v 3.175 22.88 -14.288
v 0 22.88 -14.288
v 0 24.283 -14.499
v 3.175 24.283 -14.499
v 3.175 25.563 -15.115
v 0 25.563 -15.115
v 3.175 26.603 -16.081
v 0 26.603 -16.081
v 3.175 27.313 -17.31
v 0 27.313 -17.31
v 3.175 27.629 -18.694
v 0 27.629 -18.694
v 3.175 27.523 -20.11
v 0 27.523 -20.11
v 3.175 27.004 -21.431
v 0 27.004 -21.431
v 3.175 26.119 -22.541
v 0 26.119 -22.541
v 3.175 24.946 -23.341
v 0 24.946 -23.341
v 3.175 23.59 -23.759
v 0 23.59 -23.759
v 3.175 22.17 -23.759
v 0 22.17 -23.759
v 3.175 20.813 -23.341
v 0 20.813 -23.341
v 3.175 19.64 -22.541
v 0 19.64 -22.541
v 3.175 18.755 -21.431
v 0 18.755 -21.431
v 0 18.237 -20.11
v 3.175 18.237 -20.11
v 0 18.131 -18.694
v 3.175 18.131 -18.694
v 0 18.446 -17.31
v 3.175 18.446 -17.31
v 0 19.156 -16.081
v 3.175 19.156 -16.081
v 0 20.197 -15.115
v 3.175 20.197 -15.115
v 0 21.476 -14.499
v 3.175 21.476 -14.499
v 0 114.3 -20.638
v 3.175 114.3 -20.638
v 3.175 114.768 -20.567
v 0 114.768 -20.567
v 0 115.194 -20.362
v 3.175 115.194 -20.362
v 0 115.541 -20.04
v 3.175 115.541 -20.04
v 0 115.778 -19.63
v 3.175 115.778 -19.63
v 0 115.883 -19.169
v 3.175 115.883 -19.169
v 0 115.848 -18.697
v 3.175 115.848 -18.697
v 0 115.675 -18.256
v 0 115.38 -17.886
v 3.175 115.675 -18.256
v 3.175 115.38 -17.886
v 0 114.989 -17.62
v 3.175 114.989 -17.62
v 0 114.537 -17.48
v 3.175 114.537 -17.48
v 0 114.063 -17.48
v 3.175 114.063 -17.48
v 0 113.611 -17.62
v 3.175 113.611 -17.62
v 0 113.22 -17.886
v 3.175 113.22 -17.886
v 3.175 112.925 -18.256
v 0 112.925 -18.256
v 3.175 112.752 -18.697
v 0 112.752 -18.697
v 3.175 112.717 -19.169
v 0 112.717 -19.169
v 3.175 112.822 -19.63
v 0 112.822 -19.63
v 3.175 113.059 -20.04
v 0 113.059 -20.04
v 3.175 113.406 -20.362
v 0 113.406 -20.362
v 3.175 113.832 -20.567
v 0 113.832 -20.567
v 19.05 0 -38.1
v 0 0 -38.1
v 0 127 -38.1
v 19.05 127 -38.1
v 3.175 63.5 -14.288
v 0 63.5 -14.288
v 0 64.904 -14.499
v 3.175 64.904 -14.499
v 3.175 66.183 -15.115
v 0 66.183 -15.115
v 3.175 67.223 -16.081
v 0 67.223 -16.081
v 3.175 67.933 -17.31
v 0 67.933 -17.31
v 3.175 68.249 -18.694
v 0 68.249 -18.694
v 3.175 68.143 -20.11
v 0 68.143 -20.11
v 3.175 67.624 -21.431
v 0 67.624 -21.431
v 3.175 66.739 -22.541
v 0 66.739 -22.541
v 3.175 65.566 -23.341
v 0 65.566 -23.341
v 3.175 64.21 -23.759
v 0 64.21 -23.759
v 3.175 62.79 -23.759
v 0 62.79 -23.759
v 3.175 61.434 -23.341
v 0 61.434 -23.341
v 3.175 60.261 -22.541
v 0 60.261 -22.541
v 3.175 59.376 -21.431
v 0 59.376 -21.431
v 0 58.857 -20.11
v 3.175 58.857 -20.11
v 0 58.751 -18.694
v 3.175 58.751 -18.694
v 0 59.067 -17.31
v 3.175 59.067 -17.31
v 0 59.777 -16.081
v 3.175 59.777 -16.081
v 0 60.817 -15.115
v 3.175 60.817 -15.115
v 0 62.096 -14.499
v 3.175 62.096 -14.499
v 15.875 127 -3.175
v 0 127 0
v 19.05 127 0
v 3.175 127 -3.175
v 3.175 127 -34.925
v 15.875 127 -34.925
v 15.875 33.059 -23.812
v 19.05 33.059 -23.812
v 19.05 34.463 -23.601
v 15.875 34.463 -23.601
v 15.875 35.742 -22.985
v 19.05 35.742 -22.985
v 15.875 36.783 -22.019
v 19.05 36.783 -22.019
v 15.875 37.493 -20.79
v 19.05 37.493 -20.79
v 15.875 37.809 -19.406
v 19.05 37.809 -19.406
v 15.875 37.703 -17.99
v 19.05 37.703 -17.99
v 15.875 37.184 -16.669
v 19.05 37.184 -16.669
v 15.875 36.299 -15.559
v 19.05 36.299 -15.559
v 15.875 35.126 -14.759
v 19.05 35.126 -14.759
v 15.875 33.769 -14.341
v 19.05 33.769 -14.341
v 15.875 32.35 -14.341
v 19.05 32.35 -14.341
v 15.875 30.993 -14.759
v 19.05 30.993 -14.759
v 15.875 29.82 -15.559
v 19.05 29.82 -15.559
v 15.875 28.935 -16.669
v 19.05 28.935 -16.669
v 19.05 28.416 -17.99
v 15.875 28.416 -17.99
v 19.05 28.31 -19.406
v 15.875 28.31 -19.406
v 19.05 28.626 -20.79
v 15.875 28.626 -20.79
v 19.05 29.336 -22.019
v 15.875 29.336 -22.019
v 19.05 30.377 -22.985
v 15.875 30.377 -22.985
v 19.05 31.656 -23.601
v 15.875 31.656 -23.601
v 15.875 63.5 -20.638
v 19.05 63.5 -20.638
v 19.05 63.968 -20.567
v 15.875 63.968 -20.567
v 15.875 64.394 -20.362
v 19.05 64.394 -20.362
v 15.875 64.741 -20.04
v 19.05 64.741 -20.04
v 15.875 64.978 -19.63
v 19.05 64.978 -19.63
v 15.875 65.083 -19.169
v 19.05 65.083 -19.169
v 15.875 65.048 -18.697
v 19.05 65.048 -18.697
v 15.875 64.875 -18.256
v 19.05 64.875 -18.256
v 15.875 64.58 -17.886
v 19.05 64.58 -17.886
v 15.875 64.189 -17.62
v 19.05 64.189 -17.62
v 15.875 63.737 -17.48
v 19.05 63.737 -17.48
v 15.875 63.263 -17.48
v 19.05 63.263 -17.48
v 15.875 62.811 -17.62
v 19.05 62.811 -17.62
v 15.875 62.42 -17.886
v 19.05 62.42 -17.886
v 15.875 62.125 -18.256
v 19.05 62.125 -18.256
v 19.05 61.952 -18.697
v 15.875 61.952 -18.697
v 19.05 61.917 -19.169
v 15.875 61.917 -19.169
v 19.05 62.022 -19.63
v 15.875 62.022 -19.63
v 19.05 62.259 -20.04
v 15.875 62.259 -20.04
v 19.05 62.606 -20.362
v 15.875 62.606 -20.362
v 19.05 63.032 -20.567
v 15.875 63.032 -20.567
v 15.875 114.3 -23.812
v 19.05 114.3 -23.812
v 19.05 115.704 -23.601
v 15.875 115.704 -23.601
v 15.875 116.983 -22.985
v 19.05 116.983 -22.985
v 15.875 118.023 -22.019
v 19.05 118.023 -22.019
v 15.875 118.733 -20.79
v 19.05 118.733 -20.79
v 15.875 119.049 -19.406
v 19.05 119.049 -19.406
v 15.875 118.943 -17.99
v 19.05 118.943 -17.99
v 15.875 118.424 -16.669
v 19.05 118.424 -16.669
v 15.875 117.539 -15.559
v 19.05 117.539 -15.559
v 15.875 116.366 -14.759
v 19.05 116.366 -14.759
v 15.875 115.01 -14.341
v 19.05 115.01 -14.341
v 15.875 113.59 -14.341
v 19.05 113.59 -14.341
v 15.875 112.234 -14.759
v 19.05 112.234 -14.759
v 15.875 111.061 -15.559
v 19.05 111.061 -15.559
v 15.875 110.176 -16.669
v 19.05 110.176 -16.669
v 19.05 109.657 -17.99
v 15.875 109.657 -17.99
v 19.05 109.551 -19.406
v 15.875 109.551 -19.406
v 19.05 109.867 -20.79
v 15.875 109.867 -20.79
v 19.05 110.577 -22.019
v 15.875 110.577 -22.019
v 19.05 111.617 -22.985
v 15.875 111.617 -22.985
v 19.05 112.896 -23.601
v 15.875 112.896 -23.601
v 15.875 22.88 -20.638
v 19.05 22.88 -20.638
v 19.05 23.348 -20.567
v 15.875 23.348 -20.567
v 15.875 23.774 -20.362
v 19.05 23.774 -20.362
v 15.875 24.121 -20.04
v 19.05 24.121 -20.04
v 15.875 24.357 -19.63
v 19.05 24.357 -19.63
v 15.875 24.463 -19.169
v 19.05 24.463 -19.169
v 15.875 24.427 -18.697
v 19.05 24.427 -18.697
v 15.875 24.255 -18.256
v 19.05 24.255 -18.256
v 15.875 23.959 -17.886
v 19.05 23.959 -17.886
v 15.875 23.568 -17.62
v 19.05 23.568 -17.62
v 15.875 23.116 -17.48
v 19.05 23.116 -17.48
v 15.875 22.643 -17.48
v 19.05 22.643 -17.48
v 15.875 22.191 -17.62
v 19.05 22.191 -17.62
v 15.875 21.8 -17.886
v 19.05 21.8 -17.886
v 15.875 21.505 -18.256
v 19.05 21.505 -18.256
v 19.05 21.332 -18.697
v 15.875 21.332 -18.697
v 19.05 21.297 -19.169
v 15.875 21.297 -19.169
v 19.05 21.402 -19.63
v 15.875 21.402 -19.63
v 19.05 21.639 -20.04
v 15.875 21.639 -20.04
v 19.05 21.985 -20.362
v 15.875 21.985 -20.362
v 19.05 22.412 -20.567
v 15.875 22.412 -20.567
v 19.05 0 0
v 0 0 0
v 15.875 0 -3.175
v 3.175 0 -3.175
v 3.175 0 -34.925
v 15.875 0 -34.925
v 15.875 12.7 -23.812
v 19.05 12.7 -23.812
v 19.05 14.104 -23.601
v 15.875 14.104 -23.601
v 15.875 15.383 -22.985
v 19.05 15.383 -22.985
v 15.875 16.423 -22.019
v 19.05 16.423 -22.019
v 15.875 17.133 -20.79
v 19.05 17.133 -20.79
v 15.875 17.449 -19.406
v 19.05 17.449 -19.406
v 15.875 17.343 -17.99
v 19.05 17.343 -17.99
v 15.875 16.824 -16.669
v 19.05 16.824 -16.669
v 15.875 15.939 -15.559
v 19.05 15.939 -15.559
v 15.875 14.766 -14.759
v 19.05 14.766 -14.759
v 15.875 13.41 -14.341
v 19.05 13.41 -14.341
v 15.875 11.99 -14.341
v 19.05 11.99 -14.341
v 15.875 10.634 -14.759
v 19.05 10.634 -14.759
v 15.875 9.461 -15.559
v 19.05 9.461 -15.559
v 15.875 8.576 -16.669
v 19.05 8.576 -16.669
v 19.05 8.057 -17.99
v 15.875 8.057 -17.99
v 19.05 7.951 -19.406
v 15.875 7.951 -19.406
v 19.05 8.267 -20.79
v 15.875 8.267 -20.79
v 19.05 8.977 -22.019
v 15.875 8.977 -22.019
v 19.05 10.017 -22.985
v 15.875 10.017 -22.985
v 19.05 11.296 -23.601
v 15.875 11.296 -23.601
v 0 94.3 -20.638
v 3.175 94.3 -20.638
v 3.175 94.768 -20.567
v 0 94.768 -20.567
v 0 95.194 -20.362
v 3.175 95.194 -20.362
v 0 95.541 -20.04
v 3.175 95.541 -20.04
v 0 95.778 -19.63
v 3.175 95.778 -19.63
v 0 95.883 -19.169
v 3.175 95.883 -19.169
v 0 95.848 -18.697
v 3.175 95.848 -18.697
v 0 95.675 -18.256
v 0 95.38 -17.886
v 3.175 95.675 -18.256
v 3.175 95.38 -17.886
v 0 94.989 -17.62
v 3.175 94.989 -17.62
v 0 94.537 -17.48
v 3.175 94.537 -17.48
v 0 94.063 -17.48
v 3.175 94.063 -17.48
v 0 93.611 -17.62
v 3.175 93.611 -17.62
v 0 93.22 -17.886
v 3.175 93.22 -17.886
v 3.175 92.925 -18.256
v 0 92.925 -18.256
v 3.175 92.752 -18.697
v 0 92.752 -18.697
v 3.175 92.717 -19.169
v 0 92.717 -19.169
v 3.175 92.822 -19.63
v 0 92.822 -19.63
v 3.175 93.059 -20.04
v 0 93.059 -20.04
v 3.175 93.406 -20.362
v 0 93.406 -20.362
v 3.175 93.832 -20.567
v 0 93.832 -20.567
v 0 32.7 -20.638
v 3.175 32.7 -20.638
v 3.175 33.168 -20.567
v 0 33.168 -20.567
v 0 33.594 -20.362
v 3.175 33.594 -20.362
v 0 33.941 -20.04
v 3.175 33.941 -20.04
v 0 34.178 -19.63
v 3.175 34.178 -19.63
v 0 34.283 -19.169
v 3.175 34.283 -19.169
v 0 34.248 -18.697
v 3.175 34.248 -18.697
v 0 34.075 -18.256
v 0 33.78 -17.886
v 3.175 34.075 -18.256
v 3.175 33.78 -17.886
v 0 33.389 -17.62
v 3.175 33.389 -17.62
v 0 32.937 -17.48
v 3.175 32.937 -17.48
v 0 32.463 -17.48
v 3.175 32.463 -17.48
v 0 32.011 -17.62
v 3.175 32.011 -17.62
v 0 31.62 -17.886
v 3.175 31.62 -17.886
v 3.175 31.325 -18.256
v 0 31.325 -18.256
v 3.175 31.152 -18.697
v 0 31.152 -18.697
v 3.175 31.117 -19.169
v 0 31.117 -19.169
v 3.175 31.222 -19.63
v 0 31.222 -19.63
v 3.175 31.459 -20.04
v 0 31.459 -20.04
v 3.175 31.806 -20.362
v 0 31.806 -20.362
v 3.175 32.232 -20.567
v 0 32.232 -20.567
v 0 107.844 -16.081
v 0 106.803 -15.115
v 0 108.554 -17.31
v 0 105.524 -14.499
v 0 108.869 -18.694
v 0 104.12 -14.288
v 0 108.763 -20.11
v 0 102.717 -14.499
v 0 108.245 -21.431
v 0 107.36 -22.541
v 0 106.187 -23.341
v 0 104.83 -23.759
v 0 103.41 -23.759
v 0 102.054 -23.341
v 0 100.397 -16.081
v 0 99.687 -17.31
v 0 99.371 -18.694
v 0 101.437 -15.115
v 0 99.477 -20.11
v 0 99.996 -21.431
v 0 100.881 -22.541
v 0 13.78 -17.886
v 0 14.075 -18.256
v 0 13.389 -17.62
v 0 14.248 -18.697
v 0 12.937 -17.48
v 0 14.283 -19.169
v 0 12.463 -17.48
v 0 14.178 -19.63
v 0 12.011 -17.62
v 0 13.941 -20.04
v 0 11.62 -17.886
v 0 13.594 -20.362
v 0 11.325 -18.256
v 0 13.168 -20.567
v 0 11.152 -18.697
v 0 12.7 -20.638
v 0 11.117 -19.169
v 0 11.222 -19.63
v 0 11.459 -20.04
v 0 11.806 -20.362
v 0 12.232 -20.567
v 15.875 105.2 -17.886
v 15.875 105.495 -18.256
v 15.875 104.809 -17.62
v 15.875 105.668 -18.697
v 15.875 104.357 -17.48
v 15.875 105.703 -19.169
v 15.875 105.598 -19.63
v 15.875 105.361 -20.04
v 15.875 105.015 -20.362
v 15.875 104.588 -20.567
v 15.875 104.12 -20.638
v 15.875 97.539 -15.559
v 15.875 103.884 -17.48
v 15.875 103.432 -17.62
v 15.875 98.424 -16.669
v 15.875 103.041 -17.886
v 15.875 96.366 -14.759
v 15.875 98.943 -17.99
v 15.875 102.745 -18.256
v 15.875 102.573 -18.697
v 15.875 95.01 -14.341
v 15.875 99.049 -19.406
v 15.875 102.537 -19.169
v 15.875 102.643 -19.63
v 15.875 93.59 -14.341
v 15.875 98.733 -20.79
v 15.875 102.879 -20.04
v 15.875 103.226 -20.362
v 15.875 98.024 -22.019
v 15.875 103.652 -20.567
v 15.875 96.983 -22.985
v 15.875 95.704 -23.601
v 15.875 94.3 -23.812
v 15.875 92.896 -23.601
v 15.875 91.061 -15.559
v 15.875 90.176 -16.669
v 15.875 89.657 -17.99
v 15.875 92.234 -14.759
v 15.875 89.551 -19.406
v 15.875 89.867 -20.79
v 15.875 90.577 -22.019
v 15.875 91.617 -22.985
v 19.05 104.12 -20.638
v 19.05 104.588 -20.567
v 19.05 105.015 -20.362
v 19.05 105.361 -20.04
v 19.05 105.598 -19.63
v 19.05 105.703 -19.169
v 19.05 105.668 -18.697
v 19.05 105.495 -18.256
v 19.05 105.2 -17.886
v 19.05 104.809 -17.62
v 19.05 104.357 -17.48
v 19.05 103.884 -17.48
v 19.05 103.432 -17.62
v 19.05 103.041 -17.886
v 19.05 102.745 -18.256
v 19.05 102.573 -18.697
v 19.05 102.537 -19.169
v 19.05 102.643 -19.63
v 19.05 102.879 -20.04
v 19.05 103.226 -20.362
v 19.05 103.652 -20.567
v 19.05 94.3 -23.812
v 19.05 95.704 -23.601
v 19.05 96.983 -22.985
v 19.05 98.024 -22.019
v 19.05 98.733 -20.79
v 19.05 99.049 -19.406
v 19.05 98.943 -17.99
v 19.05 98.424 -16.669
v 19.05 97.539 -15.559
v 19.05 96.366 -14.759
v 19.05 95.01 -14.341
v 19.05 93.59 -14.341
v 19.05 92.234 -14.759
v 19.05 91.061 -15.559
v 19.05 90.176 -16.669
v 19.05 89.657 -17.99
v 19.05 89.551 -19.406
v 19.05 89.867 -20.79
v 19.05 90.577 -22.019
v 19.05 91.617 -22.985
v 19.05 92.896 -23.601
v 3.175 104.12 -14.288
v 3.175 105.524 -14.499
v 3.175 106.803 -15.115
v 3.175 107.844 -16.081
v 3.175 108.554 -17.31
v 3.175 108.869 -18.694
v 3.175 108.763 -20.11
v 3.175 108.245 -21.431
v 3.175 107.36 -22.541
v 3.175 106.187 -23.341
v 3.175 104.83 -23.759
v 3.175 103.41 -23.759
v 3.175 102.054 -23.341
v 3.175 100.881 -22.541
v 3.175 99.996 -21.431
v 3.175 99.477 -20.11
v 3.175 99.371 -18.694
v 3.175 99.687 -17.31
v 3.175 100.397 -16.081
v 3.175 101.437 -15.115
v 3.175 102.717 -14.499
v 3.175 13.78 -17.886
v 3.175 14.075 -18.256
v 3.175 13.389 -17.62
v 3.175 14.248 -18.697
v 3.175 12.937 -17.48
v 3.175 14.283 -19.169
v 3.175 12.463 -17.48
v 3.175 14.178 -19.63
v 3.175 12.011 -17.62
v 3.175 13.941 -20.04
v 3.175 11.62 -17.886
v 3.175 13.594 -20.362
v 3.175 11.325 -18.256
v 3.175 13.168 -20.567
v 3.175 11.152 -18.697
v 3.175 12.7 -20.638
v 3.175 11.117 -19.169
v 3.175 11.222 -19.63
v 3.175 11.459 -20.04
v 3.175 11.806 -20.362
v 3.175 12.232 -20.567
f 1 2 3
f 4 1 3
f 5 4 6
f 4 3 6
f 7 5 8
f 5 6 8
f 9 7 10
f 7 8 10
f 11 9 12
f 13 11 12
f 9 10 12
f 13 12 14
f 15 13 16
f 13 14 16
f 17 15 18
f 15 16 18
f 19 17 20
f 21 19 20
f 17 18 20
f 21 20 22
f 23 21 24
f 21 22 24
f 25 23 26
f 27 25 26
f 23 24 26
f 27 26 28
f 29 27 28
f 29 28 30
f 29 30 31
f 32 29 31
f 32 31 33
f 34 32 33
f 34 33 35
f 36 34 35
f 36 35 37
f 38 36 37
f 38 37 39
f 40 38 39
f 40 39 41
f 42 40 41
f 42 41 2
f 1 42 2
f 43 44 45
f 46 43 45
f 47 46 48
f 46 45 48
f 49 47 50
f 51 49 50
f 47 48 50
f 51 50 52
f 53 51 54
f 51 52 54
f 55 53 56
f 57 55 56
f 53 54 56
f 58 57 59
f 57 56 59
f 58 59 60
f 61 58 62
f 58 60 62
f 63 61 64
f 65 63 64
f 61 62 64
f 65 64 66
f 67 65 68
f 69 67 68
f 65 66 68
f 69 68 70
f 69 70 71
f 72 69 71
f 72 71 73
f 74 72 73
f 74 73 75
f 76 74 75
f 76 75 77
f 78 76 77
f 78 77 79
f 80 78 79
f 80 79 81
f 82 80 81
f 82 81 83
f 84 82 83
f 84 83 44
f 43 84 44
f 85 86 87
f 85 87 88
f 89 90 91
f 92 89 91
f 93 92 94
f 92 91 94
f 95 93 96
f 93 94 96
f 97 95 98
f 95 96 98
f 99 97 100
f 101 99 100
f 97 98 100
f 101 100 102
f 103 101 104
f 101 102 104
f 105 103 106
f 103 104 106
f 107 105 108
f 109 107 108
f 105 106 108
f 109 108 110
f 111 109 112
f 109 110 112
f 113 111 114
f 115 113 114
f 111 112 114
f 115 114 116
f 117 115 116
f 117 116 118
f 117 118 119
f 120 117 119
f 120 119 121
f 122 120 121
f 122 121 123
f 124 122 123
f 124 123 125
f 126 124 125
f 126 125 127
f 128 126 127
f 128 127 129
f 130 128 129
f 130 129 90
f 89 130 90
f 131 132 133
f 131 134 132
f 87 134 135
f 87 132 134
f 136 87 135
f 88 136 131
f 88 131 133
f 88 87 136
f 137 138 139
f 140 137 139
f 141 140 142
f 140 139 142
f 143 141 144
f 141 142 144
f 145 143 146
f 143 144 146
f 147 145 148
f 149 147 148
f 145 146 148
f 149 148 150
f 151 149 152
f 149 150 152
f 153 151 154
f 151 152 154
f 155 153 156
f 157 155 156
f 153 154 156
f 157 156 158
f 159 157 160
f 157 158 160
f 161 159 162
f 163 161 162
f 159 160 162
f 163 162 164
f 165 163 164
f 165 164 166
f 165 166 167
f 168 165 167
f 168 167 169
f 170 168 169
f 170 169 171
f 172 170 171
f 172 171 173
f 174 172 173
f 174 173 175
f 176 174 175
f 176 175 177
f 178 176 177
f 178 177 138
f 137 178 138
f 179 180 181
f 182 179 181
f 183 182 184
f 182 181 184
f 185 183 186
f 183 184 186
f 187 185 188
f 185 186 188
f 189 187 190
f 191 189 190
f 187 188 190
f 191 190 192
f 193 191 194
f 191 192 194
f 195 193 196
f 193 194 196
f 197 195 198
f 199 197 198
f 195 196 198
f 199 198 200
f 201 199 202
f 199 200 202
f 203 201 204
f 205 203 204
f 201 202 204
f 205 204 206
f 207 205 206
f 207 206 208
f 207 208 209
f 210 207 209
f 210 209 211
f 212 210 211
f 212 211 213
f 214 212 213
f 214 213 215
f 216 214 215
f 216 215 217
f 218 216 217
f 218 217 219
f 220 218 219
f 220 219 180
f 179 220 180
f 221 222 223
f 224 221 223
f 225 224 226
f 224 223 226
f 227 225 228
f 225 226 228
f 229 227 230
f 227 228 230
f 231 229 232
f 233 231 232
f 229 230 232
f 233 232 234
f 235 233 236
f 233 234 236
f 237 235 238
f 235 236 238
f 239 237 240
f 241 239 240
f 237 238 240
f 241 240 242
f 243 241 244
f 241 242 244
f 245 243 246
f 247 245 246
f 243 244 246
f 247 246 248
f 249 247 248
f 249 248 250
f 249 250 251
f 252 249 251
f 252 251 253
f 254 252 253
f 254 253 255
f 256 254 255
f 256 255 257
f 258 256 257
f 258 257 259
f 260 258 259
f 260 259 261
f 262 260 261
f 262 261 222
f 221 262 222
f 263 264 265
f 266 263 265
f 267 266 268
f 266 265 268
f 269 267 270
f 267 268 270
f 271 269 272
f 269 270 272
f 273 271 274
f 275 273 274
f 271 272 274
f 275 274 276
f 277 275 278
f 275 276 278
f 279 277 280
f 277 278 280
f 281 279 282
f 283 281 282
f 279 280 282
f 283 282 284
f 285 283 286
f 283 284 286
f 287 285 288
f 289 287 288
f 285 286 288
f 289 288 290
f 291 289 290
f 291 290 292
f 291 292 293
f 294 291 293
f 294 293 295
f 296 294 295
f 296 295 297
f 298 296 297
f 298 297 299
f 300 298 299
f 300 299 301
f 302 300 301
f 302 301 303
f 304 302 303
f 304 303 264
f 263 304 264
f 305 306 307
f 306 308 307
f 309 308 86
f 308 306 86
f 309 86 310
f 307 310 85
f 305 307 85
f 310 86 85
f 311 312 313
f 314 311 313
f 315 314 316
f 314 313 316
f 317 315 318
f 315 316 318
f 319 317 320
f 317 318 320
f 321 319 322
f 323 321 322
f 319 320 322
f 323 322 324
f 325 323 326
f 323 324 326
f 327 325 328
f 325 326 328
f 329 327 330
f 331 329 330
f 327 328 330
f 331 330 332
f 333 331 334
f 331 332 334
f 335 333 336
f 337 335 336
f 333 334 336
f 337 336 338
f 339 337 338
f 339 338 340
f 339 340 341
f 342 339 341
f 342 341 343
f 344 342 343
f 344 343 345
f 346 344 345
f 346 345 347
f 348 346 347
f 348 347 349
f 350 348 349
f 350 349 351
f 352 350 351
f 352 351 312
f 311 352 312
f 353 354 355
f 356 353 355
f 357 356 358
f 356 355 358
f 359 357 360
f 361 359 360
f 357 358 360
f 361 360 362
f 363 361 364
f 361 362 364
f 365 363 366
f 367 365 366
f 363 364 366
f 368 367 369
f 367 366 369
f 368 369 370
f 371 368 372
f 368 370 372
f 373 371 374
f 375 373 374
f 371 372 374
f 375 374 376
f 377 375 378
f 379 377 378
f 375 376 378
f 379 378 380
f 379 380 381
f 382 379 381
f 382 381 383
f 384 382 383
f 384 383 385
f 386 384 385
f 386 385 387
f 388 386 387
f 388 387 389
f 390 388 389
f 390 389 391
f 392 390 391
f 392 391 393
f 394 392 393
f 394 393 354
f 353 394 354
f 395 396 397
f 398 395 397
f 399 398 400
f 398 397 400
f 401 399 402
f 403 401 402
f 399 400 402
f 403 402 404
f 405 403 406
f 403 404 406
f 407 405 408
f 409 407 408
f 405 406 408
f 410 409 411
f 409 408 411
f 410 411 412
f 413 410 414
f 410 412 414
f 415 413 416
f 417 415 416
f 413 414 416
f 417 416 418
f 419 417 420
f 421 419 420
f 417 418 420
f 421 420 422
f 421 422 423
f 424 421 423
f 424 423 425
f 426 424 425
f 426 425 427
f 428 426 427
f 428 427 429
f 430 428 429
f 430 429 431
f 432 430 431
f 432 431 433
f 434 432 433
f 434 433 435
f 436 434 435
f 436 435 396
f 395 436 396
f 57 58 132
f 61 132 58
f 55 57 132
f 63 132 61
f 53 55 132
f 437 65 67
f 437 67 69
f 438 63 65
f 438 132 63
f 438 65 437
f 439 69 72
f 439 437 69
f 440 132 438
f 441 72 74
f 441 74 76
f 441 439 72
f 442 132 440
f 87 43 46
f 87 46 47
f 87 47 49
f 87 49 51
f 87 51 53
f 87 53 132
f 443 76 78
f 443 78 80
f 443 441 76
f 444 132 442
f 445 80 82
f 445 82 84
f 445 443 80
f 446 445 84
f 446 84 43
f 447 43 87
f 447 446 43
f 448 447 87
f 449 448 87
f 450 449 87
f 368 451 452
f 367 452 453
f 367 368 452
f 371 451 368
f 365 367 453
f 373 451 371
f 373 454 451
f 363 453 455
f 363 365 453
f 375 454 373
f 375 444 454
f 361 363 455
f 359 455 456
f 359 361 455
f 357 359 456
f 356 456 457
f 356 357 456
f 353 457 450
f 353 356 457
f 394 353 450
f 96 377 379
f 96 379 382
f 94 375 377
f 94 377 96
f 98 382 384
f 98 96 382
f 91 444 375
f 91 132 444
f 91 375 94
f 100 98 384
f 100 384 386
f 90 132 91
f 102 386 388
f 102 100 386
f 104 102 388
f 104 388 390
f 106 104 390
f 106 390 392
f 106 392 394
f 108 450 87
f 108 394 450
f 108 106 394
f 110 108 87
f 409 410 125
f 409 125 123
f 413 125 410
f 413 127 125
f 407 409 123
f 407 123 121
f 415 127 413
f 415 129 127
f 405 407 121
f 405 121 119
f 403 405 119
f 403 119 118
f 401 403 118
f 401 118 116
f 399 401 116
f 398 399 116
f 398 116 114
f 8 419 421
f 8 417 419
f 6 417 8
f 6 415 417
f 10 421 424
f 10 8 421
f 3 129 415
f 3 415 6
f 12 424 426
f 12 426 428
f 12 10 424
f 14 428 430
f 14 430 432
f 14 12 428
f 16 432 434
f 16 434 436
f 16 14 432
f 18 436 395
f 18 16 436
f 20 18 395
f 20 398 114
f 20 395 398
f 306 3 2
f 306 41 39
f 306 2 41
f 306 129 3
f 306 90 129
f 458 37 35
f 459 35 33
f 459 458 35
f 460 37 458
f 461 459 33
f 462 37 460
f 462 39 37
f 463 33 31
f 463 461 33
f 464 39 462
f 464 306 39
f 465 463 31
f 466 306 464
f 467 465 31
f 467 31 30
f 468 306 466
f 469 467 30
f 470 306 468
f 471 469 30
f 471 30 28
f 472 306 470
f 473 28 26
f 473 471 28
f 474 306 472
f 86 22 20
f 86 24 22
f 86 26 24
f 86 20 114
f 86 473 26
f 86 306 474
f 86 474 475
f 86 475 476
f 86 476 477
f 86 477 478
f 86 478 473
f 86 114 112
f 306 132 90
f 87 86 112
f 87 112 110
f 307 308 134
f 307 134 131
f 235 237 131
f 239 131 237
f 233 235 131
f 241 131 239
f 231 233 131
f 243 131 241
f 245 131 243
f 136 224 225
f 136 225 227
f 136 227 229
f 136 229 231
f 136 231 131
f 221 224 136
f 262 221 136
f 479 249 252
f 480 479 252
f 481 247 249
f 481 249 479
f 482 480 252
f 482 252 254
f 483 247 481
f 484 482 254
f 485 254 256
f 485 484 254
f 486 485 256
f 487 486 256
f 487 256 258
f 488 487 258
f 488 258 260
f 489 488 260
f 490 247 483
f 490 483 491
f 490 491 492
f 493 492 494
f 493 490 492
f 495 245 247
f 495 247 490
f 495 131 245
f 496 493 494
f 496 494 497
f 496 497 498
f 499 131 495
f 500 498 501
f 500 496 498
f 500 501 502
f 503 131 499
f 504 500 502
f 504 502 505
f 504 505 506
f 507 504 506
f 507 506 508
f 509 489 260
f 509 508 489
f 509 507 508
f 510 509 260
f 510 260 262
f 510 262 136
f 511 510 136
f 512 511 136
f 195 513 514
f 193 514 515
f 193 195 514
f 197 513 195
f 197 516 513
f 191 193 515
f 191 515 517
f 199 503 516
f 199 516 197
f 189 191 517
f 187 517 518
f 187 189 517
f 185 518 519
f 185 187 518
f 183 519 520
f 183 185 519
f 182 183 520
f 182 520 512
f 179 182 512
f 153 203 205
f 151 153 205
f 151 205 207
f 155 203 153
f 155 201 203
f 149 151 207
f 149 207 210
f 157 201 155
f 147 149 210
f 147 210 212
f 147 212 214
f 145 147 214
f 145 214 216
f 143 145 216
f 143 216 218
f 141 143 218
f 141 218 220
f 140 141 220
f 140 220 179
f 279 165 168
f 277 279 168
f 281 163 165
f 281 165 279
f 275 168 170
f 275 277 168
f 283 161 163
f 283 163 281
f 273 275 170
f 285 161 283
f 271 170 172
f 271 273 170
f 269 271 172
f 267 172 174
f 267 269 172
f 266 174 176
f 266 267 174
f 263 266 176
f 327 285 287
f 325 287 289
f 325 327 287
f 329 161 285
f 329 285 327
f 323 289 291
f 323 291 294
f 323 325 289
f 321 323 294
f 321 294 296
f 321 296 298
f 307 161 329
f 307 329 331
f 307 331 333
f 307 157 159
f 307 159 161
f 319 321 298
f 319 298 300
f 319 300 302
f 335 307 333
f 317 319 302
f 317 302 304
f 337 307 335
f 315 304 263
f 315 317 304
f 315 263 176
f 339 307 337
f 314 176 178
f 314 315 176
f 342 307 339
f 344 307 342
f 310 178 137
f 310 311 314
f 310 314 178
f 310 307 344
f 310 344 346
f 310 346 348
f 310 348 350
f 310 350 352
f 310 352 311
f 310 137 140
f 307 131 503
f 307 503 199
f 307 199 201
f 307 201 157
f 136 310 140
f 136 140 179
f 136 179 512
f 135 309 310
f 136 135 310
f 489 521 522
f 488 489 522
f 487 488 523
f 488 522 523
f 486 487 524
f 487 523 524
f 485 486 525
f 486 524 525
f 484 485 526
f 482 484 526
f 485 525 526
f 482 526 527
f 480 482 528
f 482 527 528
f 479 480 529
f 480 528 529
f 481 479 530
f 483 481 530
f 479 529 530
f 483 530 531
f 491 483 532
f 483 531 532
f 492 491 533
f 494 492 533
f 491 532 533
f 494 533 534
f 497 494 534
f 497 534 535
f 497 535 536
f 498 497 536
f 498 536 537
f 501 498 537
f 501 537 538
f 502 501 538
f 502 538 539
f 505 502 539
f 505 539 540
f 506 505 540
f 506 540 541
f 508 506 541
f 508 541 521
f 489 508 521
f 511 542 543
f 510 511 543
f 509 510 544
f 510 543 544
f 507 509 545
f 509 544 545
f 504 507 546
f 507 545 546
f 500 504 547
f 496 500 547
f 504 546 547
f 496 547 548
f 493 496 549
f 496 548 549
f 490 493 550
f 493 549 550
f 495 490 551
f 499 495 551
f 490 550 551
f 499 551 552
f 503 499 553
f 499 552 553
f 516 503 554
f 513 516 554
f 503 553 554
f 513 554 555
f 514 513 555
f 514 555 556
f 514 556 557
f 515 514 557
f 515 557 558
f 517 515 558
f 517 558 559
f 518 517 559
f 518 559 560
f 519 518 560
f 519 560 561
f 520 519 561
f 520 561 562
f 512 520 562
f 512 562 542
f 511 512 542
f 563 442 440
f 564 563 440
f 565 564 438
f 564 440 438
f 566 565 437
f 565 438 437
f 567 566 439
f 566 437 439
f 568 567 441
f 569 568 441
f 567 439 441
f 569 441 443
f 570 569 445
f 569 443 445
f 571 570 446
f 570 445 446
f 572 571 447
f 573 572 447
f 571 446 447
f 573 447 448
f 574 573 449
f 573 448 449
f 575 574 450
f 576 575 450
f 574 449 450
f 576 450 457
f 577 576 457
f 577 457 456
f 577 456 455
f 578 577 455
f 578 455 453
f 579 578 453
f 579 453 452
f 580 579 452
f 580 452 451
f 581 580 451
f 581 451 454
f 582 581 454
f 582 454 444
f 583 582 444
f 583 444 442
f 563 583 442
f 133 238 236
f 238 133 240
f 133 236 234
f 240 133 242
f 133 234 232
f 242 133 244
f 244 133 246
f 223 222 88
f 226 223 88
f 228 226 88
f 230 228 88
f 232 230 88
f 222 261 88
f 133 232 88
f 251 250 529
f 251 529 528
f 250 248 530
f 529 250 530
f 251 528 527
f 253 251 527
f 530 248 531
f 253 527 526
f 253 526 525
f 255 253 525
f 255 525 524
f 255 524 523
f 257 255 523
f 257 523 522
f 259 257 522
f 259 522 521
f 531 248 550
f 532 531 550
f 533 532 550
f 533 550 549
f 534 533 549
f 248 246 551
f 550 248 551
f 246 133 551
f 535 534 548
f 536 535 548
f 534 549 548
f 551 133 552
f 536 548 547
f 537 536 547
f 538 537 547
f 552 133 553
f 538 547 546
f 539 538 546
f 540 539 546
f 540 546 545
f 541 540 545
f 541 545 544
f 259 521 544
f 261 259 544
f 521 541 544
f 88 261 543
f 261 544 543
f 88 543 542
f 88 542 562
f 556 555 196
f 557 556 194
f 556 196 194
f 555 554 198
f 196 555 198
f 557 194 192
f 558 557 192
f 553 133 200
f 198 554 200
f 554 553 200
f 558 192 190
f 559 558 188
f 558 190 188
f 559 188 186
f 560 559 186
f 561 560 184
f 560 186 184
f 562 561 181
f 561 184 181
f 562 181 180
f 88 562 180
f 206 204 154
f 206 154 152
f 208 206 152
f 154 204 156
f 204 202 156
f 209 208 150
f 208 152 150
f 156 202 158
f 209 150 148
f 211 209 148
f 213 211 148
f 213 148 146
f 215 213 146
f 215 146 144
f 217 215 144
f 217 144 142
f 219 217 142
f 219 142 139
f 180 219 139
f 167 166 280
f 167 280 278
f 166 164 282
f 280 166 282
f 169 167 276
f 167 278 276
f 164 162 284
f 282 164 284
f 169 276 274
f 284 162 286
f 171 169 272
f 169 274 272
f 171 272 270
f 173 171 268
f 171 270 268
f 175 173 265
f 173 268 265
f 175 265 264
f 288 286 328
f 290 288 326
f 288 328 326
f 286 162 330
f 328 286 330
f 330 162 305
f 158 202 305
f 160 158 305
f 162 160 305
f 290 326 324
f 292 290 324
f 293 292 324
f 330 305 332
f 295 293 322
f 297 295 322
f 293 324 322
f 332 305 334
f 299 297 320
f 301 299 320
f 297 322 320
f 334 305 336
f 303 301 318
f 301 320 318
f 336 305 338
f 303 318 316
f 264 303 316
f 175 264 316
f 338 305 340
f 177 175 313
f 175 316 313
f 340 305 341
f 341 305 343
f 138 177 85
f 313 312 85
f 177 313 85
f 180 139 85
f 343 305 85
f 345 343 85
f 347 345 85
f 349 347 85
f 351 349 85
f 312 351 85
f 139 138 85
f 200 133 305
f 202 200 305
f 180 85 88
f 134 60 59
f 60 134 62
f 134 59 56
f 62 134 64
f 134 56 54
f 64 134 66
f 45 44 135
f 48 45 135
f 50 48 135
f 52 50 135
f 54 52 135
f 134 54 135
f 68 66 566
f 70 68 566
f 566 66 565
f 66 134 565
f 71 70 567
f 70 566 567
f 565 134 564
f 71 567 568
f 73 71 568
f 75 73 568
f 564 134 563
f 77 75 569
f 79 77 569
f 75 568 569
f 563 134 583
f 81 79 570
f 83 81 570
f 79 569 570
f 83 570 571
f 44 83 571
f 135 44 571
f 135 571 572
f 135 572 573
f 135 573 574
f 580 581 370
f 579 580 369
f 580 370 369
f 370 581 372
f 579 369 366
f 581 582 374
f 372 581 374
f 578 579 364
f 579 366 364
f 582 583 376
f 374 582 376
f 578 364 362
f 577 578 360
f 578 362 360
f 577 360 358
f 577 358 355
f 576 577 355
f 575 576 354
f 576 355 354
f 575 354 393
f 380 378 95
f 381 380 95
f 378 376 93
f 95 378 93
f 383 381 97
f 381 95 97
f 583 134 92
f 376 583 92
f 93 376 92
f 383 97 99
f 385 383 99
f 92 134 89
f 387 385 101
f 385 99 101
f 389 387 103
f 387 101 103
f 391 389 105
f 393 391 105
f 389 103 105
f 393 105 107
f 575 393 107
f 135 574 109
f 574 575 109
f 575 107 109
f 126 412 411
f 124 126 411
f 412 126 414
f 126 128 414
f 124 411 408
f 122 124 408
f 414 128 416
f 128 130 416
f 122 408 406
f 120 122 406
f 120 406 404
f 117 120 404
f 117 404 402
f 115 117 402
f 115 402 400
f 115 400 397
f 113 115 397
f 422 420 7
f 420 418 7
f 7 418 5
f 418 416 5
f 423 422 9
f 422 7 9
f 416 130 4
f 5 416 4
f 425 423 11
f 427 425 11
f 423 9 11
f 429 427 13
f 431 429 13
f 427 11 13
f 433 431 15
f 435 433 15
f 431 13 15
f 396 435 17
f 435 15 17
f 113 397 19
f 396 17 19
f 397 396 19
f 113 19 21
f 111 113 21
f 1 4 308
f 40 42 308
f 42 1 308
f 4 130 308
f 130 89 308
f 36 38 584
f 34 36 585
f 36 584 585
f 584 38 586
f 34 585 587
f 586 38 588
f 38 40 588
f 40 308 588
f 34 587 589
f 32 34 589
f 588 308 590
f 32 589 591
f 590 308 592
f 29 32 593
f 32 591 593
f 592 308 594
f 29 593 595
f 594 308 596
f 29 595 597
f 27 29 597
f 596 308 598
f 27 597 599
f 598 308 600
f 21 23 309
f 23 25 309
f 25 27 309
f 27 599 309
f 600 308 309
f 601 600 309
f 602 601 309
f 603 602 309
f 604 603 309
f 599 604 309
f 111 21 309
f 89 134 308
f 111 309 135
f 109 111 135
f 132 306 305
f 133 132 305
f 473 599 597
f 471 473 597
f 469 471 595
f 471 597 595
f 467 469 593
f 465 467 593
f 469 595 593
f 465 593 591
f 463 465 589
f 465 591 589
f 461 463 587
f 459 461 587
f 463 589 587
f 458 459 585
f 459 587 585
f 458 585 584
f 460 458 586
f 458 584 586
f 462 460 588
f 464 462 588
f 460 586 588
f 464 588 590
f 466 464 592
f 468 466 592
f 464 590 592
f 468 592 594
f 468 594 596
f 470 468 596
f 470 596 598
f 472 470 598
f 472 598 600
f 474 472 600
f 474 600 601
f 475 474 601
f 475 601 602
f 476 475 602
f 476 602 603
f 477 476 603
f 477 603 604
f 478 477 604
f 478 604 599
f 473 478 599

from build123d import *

# Parameters (mm, degrees)
SKETCH1_W           = 19.05
SKETCH1_H           = 38.1
SKETCH1_W_2         = 12.7
SKETCH1_H_2         = 31.75
BOSS_EXTRUDE1_DEPTH = 127
SKETCH2_R           = 1.5875
CUT_EXTRUDE1_DEPTH  = 20.05
CUT_EXTRUDE2_REACH  = 21.05
SKETCH3_R           = 4.7625
SKETCH4_R           = 1.5875
CUT_EXTRUDE3_DEPTH  = 20.05
CUT_EXTRUDE4_REACH  = 21.05
SKETCH5_R           = 4.7625


with BuildPart() as part:
    # Sketch1 → Boss-Extrude1 (new body)
    with BuildSketch(Plane(origin=(0, 0, 0), x_dir=(1, 0, 0), z_dir=(0, 1, 0))):
        with Locations((9.525, 19.05)):
            Rectangle(SKETCH1_W, SKETCH1_H)
        with Locations((9.525, 19.05)):
            Rectangle(SKETCH1_W_2, SKETCH1_H_2, mode=Mode.SUBTRACT)
    extrude(amount=BOSS_EXTRUDE1_DEPTH)

    # Sketch2 → Cut-Extrude1 (cut, through all)
    with BuildSketch(Plane(origin=(19.05, 0, 0), x_dir=(0, 0, -1), z_dir=(1, 0, 0))):
        with Locations((19.05, 12.7)):
            Circle(SKETCH2_R)
        with Locations((19.05, 32.69996)):
            Circle(SKETCH2_R)
        with Locations((19.05, 94.30004)):
            Circle(SKETCH2_R)
        with Locations((19.05, 114.3)):
            Circle(SKETCH2_R)
    extrude(amount=-CUT_EXTRUDE1_DEPTH, mode=Mode.SUBTRACT)

    # Sketch3 → Cut-Extrude2 (cut, up to next)
    with BuildSketch(Plane(origin=(19.05, 0, 0), x_dir=(0, 0, -1), z_dir=(1, 0, 0)), mode=Mode.PRIVATE) as cut_extrude2_sk1:
        with Locations((19.05, 114.3)):
            Circle(SKETCH3_R)
    cut_extrude2_tool1 = extrude(cut_extrude2_sk1.sketch, amount=-CUT_EXTRUDE2_REACH, mode=Mode.PRIVATE) & part.part
    add(cut_extrude2_tool1.solids().sort_by_distance((19.05, 114.3, -19.05))[0], mode=Mode.SUBTRACT)
    # Sketch3 → Cut-Extrude2 (cut, up to next)
    with BuildSketch(Plane(origin=(19.05, 0, 0), x_dir=(0, 0, -1), z_dir=(1, 0, 0)), mode=Mode.PRIVATE) as cut_extrude2_sk2:
        with Locations((19.05, 94.30004)):
            Circle(SKETCH3_R)
    cut_extrude2_tool2 = extrude(cut_extrude2_sk2.sketch, amount=-CUT_EXTRUDE2_REACH, mode=Mode.PRIVATE) & part.part
    add(cut_extrude2_tool2.solids().sort_by_distance((19.05, 94.30004, -19.05))[0], mode=Mode.SUBTRACT)
    # Sketch3 → Cut-Extrude2 (cut, up to next)
    with BuildSketch(Plane(origin=(19.05, 0, 0), x_dir=(0, 0, -1), z_dir=(1, 0, 0)), mode=Mode.PRIVATE) as cut_extrude2_sk3:
        with Locations((19.05, 33.059408242)):
            Circle(SKETCH3_R)
    cut_extrude2_tool3 = extrude(cut_extrude2_sk3.sketch, amount=-CUT_EXTRUDE2_REACH, mode=Mode.PRIVATE) & part.part
    add(cut_extrude2_tool3.solids().sort_by_distance((19.05, 33.059408, -19.05))[0], mode=Mode.SUBTRACT)
    # Sketch3 → Cut-Extrude2 (cut, up to next)
    with BuildSketch(Plane(origin=(19.05, 0, 0), x_dir=(0, 0, -1), z_dir=(1, 0, 0)), mode=Mode.PRIVATE) as cut_extrude2_sk4:
        with Locations((19.05, 12.7)):
            Circle(SKETCH3_R)
    cut_extrude2_tool4 = extrude(cut_extrude2_sk4.sketch, amount=-CUT_EXTRUDE2_REACH, mode=Mode.PRIVATE) & part.part
    add(cut_extrude2_tool4.solids().sort_by_distance((19.05, 12.7, -19.05))[0], mode=Mode.SUBTRACT)

    # Sketch4 → Cut-Extrude3 (cut, through all)
    with BuildSketch(Plane(origin=(19.05, 0, 0), x_dir=(0, 0, -1), z_dir=(1, 0, 0))):
        with Locations((19.05, 22.879704121)):
            Circle(SKETCH4_R)
        with Locations((19.05, 63.5)):
            Circle(SKETCH4_R)
        with Locations((19.05, 104.120295879)):
            Circle(SKETCH4_R)
    extrude(amount=-CUT_EXTRUDE3_DEPTH, mode=Mode.SUBTRACT)

    # Sketch5 → Cut-Extrude4 (cut, up to next)
    with BuildSketch(Plane.ZY, mode=Mode.PRIVATE) as cut_extrude4_sk1:
        with Locations((-19.05, 104.120295879)):
            Circle(SKETCH5_R)
    cut_extrude4_tool1 = extrude(cut_extrude4_sk1.sketch, amount=-CUT_EXTRUDE4_REACH, mode=Mode.PRIVATE) & part.part
    add(cut_extrude4_tool1.solids().sort_by_distance((0, 104.120296, -19.05))[0], mode=Mode.SUBTRACT)
    # Sketch5 → Cut-Extrude4 (cut, up to next)
    with BuildSketch(Plane.ZY, mode=Mode.PRIVATE) as cut_extrude4_sk2:
        with Locations((-19.05, 63.5)):
            Circle(SKETCH5_R)
    cut_extrude4_tool2 = extrude(cut_extrude4_sk2.sketch, amount=-CUT_EXTRUDE4_REACH, mode=Mode.PRIVATE) & part.part
    add(cut_extrude4_tool2.solids().sort_by_distance((0, 63.5, -19.05))[0], mode=Mode.SUBTRACT)
    # Sketch5 → Cut-Extrude4 (cut, up to next)
    with BuildSketch(Plane.ZY, mode=Mode.PRIVATE) as cut_extrude4_sk3:
        with Locations((-19.05, 22.879704121)):
            Circle(SKETCH5_R)
    cut_extrude4_tool3 = extrude(cut_extrude4_sk3.sketch, amount=-CUT_EXTRUDE4_REACH, mode=Mode.PRIVATE) & part.part
    add(cut_extrude4_tool3.solids().sort_by_distance((0, 22.879704, -19.05))[0], mode=Mode.SUBTRACT)


solid = part.part
